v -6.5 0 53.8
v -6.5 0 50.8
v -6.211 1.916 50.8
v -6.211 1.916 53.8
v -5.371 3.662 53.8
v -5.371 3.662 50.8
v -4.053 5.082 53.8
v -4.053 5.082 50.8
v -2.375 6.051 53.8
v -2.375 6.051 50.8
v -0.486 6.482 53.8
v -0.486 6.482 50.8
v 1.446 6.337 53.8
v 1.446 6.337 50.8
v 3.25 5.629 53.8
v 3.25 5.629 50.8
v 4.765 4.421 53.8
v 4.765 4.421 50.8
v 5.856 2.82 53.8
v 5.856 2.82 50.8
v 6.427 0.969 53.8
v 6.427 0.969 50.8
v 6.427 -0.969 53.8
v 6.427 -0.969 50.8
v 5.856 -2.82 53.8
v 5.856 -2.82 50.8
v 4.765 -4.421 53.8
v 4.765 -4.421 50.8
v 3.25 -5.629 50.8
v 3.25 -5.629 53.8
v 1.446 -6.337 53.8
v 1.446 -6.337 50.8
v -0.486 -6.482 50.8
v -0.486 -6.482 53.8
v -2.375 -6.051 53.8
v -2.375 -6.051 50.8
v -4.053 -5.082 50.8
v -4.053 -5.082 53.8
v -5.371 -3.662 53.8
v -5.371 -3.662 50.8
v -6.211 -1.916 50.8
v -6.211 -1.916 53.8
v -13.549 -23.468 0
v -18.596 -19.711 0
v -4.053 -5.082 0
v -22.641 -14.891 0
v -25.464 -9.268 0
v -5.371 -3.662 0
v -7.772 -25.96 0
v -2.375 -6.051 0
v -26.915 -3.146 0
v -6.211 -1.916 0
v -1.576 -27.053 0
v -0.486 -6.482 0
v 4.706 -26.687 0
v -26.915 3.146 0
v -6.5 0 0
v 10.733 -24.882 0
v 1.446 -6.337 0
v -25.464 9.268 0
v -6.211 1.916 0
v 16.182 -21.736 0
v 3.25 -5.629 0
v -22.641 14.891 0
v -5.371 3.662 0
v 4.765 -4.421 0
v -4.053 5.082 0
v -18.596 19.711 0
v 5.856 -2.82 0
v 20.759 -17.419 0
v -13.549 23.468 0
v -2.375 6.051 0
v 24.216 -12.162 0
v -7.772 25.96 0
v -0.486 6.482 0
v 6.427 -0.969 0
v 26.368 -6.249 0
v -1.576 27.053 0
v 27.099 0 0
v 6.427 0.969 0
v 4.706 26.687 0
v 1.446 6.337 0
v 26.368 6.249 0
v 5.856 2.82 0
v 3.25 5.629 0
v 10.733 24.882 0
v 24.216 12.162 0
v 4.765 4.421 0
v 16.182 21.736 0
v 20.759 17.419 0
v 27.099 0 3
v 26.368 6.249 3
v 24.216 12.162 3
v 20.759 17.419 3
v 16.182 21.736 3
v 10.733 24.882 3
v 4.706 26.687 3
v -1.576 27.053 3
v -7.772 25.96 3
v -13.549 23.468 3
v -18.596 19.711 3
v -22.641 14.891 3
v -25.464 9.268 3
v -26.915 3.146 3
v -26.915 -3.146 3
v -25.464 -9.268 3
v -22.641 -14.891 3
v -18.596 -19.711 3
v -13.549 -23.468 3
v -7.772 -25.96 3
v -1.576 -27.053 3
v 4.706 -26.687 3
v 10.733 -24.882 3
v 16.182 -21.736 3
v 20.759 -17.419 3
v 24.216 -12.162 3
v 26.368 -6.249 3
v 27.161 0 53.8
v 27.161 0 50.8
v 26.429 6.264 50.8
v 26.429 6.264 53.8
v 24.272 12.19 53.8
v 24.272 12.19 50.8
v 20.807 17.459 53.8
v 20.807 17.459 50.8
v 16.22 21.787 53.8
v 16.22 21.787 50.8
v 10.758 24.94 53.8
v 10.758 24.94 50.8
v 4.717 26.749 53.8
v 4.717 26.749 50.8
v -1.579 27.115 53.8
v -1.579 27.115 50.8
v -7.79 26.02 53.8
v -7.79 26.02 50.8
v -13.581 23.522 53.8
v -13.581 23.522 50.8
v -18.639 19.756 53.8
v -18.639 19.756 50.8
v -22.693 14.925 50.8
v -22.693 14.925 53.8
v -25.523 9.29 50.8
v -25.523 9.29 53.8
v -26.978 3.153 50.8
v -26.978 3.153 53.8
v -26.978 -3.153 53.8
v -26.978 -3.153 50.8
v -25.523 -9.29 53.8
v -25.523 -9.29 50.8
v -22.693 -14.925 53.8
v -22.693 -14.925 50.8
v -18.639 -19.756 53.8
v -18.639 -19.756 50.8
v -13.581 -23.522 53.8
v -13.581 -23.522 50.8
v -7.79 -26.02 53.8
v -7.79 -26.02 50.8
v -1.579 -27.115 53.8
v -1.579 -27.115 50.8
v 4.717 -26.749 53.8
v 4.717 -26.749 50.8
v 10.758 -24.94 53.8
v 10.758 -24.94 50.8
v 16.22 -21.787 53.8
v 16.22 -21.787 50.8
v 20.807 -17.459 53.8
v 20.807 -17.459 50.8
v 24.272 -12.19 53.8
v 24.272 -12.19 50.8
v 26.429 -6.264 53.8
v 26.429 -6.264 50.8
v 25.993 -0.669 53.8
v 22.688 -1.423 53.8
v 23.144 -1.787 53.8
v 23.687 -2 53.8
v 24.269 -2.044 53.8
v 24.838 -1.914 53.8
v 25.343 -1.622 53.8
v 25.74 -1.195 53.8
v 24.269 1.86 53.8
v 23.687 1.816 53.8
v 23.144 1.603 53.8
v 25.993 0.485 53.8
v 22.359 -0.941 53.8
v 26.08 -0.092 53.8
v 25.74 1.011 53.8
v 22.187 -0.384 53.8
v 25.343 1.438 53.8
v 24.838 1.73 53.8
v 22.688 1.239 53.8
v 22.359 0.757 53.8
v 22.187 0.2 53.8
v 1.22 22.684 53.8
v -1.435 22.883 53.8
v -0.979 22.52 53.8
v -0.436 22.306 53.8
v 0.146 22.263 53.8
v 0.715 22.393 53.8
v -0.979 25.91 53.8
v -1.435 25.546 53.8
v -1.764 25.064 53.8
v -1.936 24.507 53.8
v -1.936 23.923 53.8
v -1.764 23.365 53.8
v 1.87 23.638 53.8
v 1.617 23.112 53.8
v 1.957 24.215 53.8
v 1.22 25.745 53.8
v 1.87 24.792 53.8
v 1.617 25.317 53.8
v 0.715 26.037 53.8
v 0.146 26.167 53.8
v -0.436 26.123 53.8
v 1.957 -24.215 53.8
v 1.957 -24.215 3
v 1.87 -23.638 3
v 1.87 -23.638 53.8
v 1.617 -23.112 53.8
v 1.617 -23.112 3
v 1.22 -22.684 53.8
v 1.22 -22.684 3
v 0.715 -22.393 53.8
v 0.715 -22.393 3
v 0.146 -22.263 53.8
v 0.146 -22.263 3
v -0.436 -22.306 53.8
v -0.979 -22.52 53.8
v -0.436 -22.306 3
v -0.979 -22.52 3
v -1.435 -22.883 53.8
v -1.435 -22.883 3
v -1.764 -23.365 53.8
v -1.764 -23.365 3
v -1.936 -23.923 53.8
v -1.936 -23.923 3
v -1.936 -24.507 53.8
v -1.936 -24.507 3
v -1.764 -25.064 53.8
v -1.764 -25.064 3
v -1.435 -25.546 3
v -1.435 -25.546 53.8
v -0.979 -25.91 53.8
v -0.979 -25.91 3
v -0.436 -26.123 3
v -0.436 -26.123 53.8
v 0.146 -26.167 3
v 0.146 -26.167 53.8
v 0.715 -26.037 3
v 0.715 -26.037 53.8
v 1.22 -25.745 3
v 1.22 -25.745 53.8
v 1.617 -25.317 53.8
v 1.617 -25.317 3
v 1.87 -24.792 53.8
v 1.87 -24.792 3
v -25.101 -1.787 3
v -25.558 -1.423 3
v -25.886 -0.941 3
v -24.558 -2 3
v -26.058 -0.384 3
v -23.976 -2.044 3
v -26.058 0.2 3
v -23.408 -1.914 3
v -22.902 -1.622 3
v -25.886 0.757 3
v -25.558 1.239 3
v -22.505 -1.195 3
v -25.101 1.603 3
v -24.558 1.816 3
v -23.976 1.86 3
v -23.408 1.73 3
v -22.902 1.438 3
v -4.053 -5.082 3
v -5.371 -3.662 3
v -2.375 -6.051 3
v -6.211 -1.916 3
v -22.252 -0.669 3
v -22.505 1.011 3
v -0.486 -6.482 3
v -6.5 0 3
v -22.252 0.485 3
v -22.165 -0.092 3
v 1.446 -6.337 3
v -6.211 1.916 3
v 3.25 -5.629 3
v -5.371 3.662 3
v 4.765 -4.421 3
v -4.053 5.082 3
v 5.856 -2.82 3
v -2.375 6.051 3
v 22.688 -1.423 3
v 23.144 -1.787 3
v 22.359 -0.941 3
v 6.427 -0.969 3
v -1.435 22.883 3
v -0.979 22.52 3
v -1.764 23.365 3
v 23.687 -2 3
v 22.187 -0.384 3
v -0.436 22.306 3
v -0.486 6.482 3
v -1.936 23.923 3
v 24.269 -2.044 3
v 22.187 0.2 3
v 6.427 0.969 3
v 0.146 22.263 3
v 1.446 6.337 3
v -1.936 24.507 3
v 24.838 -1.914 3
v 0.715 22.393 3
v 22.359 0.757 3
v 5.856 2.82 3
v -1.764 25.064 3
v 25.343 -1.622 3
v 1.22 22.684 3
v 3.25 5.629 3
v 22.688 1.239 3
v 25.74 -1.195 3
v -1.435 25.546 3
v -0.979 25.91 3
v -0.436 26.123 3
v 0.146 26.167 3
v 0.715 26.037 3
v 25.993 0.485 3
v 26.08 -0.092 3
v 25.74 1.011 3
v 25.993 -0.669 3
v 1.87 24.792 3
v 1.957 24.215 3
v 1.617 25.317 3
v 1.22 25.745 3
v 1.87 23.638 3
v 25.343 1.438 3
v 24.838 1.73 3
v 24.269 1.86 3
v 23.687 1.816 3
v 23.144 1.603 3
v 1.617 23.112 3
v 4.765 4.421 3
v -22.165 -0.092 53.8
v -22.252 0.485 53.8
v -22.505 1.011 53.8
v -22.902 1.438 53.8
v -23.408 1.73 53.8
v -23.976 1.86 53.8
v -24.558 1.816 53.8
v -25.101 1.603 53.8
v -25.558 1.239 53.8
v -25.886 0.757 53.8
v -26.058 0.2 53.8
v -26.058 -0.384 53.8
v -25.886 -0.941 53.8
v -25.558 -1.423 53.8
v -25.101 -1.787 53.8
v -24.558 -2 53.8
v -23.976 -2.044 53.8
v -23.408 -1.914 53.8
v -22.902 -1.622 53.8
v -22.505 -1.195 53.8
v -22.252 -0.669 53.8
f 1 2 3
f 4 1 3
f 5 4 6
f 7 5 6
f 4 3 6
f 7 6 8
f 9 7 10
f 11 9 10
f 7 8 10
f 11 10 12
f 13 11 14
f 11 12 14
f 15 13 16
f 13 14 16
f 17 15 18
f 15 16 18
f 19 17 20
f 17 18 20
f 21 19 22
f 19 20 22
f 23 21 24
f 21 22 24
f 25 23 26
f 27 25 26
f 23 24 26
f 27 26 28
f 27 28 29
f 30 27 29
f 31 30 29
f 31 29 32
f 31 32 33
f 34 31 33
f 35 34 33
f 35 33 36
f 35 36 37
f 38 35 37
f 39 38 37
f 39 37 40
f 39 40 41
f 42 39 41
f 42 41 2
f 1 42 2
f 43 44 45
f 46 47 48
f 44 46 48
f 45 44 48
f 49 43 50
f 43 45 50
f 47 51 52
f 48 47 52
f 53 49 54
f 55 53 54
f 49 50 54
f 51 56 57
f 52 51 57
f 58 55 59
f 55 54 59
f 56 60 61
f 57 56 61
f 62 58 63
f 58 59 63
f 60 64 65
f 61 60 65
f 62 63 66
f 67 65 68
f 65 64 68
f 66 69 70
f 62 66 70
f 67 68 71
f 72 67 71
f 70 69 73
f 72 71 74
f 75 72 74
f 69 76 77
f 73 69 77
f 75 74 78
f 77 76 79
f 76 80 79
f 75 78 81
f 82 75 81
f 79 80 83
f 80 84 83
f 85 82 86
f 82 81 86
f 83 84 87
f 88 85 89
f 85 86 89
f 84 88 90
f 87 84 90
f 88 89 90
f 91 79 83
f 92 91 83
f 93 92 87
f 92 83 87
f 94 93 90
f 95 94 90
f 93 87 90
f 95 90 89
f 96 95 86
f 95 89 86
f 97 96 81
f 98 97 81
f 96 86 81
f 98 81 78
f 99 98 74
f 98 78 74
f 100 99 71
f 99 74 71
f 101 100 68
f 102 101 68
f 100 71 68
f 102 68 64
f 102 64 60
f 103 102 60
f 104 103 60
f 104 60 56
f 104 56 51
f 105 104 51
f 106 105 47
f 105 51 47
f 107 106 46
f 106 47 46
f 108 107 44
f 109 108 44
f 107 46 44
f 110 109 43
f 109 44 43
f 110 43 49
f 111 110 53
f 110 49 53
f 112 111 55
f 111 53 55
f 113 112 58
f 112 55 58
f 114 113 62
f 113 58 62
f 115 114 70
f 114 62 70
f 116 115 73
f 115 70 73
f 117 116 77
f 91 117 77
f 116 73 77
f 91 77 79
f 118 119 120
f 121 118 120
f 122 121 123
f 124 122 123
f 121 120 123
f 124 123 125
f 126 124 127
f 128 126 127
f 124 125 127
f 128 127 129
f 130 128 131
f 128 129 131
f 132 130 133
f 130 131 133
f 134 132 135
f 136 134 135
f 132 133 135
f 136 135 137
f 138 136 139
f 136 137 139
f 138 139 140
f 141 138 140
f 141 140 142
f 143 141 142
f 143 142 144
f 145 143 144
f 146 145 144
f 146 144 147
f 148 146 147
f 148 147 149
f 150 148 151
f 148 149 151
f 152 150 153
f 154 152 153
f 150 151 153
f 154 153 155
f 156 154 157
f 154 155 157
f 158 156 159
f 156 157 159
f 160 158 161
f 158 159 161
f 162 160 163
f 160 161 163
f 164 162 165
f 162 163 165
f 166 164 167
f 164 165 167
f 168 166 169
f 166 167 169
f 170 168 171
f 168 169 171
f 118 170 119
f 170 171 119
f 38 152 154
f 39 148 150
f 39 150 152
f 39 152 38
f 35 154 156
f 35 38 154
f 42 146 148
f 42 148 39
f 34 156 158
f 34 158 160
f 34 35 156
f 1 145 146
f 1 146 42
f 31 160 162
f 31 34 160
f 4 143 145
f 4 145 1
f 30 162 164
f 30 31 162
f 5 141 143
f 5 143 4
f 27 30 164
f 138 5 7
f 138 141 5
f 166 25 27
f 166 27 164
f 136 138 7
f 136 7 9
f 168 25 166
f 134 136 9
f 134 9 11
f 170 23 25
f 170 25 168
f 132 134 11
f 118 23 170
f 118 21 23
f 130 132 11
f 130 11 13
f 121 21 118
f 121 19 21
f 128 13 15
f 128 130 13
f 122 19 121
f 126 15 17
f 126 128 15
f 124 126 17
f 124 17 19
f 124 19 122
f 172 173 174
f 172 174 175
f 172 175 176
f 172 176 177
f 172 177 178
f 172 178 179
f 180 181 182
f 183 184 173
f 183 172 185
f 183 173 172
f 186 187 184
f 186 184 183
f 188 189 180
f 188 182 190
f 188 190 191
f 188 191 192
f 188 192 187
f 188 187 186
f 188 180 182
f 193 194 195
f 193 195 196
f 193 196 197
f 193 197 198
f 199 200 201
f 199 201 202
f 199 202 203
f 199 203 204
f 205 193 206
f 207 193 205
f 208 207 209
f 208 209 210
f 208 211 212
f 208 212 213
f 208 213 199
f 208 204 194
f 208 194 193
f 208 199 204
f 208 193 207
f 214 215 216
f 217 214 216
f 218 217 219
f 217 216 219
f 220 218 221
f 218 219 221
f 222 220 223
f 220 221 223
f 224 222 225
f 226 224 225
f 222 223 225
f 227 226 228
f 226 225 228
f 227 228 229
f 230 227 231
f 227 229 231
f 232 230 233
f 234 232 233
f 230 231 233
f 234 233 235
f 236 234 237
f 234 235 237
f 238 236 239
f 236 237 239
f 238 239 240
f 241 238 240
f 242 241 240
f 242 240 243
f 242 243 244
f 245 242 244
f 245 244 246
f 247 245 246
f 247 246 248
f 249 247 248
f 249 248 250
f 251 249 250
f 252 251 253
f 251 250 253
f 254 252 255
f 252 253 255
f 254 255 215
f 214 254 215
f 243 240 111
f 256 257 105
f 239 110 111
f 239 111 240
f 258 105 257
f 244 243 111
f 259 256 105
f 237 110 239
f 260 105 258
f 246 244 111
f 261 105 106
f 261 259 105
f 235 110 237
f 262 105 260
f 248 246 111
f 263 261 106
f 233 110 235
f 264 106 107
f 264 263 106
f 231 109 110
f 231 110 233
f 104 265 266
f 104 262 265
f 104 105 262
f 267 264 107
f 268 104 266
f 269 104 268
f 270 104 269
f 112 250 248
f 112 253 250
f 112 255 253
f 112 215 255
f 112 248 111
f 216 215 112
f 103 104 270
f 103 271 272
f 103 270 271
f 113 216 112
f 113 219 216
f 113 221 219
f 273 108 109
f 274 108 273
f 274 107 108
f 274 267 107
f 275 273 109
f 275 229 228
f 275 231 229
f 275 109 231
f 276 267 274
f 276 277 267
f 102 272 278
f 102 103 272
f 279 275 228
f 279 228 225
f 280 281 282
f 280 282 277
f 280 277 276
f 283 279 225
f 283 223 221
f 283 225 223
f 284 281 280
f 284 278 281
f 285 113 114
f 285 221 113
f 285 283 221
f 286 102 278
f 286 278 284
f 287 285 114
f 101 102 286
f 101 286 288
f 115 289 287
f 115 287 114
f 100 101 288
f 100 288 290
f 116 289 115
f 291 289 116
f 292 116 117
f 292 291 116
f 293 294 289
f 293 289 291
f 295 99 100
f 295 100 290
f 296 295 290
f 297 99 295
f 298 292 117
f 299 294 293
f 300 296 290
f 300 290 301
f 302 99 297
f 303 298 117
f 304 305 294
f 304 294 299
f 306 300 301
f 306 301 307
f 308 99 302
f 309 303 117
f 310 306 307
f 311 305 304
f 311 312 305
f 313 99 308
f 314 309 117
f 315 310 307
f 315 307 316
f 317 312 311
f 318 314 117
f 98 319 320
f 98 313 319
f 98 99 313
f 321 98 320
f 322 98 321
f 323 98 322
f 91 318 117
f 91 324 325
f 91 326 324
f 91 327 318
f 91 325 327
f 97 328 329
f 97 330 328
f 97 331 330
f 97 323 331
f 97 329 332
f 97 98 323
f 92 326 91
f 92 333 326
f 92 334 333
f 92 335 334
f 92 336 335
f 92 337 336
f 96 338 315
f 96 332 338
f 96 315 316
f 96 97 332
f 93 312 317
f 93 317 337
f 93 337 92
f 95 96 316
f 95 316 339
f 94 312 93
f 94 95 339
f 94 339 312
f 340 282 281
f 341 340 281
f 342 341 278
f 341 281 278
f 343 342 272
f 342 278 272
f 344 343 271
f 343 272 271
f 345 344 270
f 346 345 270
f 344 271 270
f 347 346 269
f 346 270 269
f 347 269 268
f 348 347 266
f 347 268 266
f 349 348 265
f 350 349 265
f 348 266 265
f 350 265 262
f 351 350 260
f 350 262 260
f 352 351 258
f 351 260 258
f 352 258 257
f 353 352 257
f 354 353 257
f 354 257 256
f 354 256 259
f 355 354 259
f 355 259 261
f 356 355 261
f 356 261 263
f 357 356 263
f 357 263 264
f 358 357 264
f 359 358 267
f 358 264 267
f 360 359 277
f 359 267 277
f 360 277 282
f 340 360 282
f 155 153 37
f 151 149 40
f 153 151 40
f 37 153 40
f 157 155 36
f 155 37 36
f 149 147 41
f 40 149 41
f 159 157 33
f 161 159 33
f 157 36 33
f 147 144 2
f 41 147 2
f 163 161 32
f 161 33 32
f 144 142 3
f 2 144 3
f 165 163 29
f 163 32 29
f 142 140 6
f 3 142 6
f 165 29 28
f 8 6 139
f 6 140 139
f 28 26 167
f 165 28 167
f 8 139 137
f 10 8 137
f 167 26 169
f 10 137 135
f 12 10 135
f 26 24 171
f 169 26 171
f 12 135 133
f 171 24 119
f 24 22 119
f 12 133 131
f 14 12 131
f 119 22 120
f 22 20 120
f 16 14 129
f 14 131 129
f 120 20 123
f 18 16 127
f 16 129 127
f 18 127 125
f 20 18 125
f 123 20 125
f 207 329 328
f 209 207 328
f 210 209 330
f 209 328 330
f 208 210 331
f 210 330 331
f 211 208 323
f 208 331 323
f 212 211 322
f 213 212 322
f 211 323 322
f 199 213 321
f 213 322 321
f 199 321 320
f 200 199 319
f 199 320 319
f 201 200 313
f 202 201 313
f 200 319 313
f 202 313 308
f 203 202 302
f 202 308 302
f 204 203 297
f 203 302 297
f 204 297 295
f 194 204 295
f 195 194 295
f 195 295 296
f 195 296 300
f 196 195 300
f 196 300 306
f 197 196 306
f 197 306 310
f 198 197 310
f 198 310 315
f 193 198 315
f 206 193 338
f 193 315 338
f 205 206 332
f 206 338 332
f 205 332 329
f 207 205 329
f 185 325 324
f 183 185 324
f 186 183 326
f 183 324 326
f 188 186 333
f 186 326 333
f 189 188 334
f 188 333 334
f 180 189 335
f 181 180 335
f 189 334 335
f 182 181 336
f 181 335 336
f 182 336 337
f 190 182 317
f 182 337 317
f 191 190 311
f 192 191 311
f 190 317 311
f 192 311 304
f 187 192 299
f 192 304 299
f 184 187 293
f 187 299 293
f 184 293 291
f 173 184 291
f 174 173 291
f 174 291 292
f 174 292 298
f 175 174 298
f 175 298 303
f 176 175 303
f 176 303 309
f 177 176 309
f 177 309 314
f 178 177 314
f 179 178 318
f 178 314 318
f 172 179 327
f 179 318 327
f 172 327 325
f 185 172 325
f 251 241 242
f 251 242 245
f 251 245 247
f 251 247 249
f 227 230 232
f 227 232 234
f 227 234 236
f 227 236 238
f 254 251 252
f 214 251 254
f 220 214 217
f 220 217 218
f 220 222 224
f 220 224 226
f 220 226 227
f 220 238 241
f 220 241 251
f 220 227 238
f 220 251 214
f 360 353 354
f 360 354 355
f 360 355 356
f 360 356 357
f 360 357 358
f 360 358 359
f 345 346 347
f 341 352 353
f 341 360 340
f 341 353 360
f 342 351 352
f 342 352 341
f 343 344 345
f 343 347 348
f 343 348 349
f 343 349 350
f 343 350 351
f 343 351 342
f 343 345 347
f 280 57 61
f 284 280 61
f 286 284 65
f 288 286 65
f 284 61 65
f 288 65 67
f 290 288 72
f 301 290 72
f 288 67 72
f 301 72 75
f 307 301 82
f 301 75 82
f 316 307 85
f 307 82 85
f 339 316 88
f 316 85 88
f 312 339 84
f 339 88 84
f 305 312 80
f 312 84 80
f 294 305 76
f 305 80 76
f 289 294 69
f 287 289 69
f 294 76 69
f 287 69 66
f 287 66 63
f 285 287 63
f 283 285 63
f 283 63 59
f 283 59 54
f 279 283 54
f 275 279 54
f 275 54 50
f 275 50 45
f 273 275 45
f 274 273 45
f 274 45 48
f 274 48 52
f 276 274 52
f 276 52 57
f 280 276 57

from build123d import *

# Parameters (mm, degrees)
F0_R     = 27.09856
F1_DEPTH = 3
F2_R     = 1.957464
F3_DEPTH = 50.8
F5_R     = 27.161268
F6_DEPTH = 3
F8_D     = 13
F8_2_D   = 13


with BuildPart() as f1:
    # F0 (on Top) → F1 (new body)
    with BuildSketch(Plane.XY):
        Circle(F0_R)
    extrude(amount=F1_DEPTH)

    # F2 (on face) → F3 (join)
    with BuildSketch(Plane.XY.offset(3)):
        with Locations((0, 24.214765)):
            Circle(F2_R)
        with Locations((0, -24.214765)):
            Circle(F2_R)
        with Locations((-24.122693, -0.092071)):
            Circle(F2_R)
        with Locations((24.122693, -0.092071)):
            Circle(F2_R)
    extrude(amount=F3_DEPTH)

    # F8 (through all)
    with Locations(Plane.XY.offset(53.8)):
        with Locations((0, 0)):
            Hole(F8_D / 2)


with BuildPart() as f6:
    # F5 (on offset) → F6 (new body)
    with BuildSketch(Plane.XY.offset(50.8)):
        Circle(F5_R)
    extrude(amount=F6_DEPTH)

    # F8#2 (through all)
    with Locations(Plane.XY.offset(53.8)):
        with Locations((0, 0)):
            Hole(F8_2_D / 2)


solid = Compound([f1.part, f6.part])
